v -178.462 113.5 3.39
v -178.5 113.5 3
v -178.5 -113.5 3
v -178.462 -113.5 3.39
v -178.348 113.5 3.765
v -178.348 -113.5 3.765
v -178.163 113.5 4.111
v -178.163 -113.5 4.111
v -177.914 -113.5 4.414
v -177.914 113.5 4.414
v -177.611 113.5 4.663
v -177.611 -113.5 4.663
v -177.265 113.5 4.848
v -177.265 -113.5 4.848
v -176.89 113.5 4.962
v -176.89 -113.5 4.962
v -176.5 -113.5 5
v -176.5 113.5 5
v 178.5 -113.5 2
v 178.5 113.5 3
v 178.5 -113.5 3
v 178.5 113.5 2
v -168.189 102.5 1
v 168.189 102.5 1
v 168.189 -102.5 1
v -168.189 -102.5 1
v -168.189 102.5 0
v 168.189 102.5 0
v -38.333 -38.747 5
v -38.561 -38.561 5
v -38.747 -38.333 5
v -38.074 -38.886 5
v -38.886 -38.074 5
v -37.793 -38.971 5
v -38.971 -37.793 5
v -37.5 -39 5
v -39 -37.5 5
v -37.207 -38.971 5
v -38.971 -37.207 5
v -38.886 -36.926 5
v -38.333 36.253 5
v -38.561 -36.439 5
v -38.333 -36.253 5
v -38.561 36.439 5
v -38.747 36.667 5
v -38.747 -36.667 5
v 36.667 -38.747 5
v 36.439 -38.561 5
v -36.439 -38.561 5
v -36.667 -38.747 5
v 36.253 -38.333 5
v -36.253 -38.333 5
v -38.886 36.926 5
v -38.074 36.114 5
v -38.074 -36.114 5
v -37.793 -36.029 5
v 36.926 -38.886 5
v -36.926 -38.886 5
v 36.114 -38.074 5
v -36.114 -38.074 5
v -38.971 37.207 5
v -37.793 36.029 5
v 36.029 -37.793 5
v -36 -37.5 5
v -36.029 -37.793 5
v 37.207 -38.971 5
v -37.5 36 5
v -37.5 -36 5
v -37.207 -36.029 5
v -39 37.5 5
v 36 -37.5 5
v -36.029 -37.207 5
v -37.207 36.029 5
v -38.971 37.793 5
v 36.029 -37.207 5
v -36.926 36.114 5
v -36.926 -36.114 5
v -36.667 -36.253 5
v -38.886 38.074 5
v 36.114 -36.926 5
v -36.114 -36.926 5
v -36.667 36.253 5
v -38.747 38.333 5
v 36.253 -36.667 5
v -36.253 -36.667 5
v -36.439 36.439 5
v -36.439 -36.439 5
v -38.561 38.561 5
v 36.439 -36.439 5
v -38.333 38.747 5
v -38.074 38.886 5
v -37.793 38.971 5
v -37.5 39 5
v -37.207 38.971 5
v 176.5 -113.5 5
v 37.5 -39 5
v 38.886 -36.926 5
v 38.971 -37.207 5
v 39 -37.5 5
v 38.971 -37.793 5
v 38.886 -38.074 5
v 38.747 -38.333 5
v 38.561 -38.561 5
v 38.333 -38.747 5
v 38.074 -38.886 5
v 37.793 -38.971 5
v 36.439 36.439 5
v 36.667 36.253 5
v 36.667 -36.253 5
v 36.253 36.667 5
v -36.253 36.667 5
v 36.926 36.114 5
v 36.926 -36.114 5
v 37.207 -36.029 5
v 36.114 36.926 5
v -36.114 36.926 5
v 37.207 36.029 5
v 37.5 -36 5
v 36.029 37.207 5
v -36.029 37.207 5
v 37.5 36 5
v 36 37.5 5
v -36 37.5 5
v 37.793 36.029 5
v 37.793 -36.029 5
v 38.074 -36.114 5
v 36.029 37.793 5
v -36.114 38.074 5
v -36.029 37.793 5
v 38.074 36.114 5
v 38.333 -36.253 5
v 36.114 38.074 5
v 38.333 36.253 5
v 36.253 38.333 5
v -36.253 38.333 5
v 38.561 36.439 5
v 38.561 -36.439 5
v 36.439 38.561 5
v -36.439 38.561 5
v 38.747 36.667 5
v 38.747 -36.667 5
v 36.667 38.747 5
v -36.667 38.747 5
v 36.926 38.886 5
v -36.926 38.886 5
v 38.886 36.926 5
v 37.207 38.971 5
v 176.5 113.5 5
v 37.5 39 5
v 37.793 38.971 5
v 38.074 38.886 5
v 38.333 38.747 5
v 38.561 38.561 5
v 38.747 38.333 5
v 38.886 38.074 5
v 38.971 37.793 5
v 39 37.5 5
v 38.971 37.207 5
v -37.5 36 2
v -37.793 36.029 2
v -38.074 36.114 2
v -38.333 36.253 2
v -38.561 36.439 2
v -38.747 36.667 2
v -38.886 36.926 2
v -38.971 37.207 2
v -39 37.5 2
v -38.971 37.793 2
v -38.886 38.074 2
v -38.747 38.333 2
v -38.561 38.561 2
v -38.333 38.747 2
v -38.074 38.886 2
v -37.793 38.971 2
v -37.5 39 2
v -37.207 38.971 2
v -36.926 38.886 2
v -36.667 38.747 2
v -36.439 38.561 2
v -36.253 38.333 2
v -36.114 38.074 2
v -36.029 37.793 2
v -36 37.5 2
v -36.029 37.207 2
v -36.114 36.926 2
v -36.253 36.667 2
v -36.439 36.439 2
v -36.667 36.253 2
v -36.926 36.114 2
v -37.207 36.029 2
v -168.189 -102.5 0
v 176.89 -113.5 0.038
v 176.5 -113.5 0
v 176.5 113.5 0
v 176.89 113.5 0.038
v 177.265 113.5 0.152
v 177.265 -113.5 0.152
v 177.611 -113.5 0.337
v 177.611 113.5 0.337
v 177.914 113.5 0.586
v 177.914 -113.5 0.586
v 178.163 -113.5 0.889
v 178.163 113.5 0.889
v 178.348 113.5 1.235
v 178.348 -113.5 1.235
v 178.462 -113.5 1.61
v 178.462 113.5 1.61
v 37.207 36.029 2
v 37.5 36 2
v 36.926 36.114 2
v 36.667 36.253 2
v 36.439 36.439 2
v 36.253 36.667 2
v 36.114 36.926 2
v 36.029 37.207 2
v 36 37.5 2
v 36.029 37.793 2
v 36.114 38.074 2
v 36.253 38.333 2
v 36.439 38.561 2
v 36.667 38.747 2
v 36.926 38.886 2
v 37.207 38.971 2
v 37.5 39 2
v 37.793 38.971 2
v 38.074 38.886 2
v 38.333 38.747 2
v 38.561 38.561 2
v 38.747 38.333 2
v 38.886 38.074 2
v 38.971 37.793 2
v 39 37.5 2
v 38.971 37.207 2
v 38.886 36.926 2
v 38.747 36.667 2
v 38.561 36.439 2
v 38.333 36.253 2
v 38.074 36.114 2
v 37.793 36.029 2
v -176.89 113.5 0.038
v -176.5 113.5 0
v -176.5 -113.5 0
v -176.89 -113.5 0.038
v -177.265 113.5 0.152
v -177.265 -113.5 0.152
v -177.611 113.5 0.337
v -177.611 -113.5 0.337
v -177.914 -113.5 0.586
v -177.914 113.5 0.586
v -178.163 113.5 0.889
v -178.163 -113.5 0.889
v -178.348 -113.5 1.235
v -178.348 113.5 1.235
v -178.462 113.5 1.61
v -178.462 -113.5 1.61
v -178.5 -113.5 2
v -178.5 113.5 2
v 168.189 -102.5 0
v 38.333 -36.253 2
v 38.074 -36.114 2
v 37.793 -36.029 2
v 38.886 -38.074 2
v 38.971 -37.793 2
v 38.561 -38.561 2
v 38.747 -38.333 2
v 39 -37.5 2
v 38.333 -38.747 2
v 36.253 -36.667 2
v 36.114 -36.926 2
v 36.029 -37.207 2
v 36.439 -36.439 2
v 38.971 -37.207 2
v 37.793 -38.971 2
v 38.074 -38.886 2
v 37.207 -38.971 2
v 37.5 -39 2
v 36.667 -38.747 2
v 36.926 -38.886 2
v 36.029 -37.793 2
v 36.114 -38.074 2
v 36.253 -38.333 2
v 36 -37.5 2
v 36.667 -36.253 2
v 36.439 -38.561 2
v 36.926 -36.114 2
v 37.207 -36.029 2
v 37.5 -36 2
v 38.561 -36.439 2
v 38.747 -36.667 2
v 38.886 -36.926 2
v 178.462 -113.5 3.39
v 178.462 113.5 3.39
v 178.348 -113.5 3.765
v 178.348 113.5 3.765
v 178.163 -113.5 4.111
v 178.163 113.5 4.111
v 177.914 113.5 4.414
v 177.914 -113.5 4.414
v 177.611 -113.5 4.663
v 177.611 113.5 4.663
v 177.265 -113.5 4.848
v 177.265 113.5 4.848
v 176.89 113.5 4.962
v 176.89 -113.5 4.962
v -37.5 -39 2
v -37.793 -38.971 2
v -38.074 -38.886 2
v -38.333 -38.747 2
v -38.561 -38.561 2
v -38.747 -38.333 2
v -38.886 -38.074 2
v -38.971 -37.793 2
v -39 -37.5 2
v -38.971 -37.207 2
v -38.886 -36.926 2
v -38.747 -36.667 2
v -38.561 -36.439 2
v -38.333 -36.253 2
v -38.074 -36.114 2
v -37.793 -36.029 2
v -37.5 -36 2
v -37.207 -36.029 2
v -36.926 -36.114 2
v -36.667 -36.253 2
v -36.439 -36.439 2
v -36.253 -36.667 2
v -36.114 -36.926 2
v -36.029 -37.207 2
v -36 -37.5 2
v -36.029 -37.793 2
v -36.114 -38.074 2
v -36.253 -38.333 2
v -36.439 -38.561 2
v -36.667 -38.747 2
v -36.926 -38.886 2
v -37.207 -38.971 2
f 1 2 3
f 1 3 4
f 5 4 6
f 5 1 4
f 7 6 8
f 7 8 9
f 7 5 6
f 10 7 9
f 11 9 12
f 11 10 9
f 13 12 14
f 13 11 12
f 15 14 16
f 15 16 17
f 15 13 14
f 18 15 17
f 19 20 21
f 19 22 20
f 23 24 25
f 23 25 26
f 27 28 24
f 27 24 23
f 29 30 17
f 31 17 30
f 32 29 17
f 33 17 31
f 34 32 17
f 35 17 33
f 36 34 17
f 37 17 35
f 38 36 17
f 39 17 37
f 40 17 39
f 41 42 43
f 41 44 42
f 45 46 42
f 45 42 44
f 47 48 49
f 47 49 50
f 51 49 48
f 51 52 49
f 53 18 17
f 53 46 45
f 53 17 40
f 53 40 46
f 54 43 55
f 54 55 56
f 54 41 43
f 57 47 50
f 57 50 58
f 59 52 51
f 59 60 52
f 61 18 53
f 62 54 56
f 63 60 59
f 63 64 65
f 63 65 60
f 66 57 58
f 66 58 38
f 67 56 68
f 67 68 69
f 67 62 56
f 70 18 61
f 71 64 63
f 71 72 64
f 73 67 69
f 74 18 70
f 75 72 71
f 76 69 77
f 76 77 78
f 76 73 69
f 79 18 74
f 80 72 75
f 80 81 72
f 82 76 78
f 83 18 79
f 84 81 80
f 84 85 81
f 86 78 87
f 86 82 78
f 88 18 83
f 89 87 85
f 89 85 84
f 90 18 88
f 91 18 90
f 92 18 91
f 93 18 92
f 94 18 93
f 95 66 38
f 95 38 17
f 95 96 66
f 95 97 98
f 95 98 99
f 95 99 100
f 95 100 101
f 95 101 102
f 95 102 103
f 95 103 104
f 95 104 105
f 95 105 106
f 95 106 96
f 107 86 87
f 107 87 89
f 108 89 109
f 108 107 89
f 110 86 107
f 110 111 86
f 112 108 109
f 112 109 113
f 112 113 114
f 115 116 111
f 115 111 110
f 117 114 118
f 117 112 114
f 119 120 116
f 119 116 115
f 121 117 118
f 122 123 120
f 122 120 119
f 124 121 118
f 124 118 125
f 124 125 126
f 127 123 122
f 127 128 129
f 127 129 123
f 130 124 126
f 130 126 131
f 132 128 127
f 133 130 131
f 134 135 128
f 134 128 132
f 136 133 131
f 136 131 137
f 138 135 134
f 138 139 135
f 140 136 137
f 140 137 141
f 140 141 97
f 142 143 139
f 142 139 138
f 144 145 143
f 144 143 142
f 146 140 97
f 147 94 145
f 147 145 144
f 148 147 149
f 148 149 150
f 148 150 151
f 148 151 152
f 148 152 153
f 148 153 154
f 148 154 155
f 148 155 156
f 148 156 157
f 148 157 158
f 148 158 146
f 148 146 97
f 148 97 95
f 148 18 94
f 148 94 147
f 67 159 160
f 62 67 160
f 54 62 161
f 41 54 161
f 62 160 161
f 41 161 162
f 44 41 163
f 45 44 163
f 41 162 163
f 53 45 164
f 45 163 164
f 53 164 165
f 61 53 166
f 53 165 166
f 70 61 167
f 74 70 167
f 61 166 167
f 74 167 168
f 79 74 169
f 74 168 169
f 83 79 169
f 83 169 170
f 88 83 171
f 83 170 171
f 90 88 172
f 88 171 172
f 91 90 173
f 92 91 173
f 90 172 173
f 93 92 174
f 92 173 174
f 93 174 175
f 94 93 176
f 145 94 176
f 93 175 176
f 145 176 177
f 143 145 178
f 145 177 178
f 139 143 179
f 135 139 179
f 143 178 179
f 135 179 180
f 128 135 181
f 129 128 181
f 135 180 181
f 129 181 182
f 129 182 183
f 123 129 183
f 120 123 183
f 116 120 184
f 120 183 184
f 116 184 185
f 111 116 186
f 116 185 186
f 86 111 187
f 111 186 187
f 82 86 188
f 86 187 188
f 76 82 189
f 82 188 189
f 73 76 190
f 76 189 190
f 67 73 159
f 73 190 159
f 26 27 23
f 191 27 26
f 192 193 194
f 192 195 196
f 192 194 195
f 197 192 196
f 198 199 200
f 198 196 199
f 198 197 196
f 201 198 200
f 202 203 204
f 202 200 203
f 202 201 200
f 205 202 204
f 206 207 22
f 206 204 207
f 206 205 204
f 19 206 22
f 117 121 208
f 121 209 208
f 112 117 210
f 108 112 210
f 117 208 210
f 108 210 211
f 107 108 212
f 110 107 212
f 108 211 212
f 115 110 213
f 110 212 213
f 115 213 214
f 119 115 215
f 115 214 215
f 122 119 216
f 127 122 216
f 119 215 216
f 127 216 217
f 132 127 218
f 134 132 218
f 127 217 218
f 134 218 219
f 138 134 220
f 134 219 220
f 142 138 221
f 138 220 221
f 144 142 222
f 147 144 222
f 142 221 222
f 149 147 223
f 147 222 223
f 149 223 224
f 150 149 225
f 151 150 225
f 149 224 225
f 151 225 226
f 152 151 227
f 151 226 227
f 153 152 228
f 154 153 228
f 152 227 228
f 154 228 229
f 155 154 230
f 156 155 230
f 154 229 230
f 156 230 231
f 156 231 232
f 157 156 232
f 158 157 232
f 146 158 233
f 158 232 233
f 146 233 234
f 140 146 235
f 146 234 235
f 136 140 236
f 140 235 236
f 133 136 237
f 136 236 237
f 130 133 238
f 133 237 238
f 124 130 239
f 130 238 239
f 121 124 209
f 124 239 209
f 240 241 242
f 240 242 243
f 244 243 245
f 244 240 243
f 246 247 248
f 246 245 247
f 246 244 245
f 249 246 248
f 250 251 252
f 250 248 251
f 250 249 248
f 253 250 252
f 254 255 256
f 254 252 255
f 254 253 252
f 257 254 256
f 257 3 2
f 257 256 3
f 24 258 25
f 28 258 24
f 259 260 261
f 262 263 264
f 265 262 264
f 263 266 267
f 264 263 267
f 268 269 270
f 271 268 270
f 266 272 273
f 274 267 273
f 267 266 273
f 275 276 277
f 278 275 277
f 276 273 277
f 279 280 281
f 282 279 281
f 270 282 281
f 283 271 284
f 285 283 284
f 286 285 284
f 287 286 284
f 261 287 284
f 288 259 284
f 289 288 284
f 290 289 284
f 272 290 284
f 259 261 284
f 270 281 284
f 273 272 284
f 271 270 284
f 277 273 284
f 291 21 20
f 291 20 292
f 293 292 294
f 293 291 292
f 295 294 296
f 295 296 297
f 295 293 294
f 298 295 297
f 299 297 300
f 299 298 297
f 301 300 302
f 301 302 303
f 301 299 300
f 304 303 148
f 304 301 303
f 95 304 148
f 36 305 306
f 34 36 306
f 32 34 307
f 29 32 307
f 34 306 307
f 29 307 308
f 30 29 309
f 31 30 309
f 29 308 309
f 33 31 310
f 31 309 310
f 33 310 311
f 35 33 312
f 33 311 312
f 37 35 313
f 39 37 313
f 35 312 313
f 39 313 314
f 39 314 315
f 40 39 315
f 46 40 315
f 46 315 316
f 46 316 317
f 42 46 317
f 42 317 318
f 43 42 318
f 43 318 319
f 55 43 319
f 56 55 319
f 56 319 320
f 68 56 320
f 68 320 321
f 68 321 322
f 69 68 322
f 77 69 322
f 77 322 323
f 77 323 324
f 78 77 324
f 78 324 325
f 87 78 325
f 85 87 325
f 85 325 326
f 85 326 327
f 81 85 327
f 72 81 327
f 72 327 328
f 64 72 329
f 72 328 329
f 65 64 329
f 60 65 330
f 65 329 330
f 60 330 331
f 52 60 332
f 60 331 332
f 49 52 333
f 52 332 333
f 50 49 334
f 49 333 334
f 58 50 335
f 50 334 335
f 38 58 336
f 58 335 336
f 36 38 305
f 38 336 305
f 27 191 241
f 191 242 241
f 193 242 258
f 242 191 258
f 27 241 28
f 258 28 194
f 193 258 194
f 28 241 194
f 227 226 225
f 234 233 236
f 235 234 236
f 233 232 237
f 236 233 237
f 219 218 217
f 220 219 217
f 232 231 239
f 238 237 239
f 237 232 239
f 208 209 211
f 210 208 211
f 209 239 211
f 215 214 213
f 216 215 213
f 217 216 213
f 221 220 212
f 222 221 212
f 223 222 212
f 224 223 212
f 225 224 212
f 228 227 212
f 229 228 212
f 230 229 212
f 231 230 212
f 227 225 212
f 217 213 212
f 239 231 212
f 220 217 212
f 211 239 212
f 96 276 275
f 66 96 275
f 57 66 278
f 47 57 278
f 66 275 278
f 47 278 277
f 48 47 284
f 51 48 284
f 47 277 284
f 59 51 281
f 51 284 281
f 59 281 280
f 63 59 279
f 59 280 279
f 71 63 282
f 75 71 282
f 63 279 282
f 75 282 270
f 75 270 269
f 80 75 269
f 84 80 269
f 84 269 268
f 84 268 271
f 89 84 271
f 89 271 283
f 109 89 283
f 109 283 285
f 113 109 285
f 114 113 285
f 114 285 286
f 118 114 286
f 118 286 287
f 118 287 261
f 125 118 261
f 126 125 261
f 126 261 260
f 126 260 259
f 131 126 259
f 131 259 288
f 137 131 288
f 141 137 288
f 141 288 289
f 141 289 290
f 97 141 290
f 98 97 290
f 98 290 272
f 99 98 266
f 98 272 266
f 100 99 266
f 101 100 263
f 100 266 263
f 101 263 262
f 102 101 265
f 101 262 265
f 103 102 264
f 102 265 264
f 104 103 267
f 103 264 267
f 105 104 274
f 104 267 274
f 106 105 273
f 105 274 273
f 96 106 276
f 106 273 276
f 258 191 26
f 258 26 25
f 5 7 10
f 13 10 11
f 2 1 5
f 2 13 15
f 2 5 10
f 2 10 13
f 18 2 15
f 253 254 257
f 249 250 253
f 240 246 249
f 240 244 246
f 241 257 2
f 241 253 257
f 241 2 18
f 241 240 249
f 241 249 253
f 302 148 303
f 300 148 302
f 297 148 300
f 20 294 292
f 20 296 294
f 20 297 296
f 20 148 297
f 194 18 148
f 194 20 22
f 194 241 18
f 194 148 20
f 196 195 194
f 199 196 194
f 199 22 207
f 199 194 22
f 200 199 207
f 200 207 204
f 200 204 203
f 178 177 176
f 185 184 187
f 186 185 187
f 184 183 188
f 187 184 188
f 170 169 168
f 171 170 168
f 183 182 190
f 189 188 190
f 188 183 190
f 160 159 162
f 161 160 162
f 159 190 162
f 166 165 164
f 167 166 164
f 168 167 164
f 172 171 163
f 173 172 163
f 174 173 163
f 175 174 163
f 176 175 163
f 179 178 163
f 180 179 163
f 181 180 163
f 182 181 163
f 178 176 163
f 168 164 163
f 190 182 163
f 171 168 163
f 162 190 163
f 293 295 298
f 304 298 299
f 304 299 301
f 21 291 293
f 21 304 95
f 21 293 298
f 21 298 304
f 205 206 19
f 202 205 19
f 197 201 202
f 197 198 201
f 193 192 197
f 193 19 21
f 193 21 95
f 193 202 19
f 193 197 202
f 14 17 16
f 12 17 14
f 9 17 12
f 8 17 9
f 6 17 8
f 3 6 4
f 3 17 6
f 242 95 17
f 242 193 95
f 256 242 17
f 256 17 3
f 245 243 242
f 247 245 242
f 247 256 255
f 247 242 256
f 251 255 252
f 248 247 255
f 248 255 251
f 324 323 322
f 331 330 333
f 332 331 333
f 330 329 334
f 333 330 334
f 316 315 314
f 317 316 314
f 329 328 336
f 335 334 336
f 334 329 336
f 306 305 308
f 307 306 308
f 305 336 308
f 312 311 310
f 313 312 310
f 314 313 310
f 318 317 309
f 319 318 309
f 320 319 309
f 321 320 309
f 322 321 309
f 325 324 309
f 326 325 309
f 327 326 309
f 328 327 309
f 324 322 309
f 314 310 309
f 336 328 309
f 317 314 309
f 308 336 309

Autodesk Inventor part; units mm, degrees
ref_plane "YZ Plane" through (0, 0, 0) normal (1, 0, 0) x (0, 1, 0)
ref_plane "XZ Plane" through (0, 0, 0) normal (0, 1, 0) x (-1, 0, 0)
ref_plane "XY Plane" through (0, 0, 0) normal (0, 0, 1) x (1, 0, 0)
sketch "Sketch1" plane through (0, 0, 0) normal (0, 0, 1) x (1, 0, 0)
  line L0 (178.5, -113.5) -> (-178.5, -113.5)
  line L1 (-178.5, -113.5) -> (-178.5, 113.5)
  line L2 (-178.5, 113.5) -> (178.5, 113.5)
  line L3 (178.5, 113.5) -> (178.5, -113.5)
  line L4 (178.5, -113.5) -> (-178.5, 113.5) construction
  line L5 (-178.5, -113.5) -> (178.5, 113.5) construction
  point P0 (0, 0)
  dimension "d0" = 357
  dimension "d1" = 227
extrude "Extrusion1" add sketch "Sketch1" along normal blind 5
sketch "Sketch2" plane through (0, 0, 5) normal (0, 0, 1) x (1, 0, 0)
  line L0 (37.5, -37.5) -> (-37.5, -37.5) construction
  line L1 (-37.5, -37.5) -> (-37.5, 37.5) construction
  line L2 (-37.5, 37.5) -> (37.5, 37.5) construction
  line L3 (37.5, 37.5) -> (37.5, -37.5) construction
  line L4 (37.5, -37.5) -> (-37.5, 37.5) construction
  line L5 (-37.5, -37.5) -> (37.5, 37.5) construction
  point P0 (0, 0)
  dimension "d4" = 75
  dimension "d5" = 75
hole "Hole1" at (-37.5, 37.5, 5) at (37.5, 37.5, 5) at (37.5, -37.5, 5) at (-37.5, -37.5, 5) direction (0, 0, -1) diameter 3 depth 3
fillet "Fillet1" radius 2 4 edges at (-178.5, 0, 0) (-178.5, 0, 5) (178.5, 0, 5) (178.5, 0, 0)
sketch "Sketch3" plane through (0, 0, 0) normal (0, 0, -1) x (-1, 0, 0)
  line L0 (168.1886, -102.5002) -> (-168.1886, -102.5002)
  line L1 (-168.1886, -102.5002) -> (-168.1886, 102.5002)
  line L2 (-168.1886, 102.5002) -> (168.1886, 102.5002)
  line L3 (168.1886, 102.5002) -> (168.1886, -102.5002)
  line L4 (168.1886, -102.5002) -> (-168.1886, 102.5002) construction
  line L5 (-168.1886, -102.5002) -> (168.1886, 102.5002) construction
  point P0 (0, 0)
extrude "Extrusion2" cut sketch "Sketch3" against normal blind 1
properties part number "Monitor"
